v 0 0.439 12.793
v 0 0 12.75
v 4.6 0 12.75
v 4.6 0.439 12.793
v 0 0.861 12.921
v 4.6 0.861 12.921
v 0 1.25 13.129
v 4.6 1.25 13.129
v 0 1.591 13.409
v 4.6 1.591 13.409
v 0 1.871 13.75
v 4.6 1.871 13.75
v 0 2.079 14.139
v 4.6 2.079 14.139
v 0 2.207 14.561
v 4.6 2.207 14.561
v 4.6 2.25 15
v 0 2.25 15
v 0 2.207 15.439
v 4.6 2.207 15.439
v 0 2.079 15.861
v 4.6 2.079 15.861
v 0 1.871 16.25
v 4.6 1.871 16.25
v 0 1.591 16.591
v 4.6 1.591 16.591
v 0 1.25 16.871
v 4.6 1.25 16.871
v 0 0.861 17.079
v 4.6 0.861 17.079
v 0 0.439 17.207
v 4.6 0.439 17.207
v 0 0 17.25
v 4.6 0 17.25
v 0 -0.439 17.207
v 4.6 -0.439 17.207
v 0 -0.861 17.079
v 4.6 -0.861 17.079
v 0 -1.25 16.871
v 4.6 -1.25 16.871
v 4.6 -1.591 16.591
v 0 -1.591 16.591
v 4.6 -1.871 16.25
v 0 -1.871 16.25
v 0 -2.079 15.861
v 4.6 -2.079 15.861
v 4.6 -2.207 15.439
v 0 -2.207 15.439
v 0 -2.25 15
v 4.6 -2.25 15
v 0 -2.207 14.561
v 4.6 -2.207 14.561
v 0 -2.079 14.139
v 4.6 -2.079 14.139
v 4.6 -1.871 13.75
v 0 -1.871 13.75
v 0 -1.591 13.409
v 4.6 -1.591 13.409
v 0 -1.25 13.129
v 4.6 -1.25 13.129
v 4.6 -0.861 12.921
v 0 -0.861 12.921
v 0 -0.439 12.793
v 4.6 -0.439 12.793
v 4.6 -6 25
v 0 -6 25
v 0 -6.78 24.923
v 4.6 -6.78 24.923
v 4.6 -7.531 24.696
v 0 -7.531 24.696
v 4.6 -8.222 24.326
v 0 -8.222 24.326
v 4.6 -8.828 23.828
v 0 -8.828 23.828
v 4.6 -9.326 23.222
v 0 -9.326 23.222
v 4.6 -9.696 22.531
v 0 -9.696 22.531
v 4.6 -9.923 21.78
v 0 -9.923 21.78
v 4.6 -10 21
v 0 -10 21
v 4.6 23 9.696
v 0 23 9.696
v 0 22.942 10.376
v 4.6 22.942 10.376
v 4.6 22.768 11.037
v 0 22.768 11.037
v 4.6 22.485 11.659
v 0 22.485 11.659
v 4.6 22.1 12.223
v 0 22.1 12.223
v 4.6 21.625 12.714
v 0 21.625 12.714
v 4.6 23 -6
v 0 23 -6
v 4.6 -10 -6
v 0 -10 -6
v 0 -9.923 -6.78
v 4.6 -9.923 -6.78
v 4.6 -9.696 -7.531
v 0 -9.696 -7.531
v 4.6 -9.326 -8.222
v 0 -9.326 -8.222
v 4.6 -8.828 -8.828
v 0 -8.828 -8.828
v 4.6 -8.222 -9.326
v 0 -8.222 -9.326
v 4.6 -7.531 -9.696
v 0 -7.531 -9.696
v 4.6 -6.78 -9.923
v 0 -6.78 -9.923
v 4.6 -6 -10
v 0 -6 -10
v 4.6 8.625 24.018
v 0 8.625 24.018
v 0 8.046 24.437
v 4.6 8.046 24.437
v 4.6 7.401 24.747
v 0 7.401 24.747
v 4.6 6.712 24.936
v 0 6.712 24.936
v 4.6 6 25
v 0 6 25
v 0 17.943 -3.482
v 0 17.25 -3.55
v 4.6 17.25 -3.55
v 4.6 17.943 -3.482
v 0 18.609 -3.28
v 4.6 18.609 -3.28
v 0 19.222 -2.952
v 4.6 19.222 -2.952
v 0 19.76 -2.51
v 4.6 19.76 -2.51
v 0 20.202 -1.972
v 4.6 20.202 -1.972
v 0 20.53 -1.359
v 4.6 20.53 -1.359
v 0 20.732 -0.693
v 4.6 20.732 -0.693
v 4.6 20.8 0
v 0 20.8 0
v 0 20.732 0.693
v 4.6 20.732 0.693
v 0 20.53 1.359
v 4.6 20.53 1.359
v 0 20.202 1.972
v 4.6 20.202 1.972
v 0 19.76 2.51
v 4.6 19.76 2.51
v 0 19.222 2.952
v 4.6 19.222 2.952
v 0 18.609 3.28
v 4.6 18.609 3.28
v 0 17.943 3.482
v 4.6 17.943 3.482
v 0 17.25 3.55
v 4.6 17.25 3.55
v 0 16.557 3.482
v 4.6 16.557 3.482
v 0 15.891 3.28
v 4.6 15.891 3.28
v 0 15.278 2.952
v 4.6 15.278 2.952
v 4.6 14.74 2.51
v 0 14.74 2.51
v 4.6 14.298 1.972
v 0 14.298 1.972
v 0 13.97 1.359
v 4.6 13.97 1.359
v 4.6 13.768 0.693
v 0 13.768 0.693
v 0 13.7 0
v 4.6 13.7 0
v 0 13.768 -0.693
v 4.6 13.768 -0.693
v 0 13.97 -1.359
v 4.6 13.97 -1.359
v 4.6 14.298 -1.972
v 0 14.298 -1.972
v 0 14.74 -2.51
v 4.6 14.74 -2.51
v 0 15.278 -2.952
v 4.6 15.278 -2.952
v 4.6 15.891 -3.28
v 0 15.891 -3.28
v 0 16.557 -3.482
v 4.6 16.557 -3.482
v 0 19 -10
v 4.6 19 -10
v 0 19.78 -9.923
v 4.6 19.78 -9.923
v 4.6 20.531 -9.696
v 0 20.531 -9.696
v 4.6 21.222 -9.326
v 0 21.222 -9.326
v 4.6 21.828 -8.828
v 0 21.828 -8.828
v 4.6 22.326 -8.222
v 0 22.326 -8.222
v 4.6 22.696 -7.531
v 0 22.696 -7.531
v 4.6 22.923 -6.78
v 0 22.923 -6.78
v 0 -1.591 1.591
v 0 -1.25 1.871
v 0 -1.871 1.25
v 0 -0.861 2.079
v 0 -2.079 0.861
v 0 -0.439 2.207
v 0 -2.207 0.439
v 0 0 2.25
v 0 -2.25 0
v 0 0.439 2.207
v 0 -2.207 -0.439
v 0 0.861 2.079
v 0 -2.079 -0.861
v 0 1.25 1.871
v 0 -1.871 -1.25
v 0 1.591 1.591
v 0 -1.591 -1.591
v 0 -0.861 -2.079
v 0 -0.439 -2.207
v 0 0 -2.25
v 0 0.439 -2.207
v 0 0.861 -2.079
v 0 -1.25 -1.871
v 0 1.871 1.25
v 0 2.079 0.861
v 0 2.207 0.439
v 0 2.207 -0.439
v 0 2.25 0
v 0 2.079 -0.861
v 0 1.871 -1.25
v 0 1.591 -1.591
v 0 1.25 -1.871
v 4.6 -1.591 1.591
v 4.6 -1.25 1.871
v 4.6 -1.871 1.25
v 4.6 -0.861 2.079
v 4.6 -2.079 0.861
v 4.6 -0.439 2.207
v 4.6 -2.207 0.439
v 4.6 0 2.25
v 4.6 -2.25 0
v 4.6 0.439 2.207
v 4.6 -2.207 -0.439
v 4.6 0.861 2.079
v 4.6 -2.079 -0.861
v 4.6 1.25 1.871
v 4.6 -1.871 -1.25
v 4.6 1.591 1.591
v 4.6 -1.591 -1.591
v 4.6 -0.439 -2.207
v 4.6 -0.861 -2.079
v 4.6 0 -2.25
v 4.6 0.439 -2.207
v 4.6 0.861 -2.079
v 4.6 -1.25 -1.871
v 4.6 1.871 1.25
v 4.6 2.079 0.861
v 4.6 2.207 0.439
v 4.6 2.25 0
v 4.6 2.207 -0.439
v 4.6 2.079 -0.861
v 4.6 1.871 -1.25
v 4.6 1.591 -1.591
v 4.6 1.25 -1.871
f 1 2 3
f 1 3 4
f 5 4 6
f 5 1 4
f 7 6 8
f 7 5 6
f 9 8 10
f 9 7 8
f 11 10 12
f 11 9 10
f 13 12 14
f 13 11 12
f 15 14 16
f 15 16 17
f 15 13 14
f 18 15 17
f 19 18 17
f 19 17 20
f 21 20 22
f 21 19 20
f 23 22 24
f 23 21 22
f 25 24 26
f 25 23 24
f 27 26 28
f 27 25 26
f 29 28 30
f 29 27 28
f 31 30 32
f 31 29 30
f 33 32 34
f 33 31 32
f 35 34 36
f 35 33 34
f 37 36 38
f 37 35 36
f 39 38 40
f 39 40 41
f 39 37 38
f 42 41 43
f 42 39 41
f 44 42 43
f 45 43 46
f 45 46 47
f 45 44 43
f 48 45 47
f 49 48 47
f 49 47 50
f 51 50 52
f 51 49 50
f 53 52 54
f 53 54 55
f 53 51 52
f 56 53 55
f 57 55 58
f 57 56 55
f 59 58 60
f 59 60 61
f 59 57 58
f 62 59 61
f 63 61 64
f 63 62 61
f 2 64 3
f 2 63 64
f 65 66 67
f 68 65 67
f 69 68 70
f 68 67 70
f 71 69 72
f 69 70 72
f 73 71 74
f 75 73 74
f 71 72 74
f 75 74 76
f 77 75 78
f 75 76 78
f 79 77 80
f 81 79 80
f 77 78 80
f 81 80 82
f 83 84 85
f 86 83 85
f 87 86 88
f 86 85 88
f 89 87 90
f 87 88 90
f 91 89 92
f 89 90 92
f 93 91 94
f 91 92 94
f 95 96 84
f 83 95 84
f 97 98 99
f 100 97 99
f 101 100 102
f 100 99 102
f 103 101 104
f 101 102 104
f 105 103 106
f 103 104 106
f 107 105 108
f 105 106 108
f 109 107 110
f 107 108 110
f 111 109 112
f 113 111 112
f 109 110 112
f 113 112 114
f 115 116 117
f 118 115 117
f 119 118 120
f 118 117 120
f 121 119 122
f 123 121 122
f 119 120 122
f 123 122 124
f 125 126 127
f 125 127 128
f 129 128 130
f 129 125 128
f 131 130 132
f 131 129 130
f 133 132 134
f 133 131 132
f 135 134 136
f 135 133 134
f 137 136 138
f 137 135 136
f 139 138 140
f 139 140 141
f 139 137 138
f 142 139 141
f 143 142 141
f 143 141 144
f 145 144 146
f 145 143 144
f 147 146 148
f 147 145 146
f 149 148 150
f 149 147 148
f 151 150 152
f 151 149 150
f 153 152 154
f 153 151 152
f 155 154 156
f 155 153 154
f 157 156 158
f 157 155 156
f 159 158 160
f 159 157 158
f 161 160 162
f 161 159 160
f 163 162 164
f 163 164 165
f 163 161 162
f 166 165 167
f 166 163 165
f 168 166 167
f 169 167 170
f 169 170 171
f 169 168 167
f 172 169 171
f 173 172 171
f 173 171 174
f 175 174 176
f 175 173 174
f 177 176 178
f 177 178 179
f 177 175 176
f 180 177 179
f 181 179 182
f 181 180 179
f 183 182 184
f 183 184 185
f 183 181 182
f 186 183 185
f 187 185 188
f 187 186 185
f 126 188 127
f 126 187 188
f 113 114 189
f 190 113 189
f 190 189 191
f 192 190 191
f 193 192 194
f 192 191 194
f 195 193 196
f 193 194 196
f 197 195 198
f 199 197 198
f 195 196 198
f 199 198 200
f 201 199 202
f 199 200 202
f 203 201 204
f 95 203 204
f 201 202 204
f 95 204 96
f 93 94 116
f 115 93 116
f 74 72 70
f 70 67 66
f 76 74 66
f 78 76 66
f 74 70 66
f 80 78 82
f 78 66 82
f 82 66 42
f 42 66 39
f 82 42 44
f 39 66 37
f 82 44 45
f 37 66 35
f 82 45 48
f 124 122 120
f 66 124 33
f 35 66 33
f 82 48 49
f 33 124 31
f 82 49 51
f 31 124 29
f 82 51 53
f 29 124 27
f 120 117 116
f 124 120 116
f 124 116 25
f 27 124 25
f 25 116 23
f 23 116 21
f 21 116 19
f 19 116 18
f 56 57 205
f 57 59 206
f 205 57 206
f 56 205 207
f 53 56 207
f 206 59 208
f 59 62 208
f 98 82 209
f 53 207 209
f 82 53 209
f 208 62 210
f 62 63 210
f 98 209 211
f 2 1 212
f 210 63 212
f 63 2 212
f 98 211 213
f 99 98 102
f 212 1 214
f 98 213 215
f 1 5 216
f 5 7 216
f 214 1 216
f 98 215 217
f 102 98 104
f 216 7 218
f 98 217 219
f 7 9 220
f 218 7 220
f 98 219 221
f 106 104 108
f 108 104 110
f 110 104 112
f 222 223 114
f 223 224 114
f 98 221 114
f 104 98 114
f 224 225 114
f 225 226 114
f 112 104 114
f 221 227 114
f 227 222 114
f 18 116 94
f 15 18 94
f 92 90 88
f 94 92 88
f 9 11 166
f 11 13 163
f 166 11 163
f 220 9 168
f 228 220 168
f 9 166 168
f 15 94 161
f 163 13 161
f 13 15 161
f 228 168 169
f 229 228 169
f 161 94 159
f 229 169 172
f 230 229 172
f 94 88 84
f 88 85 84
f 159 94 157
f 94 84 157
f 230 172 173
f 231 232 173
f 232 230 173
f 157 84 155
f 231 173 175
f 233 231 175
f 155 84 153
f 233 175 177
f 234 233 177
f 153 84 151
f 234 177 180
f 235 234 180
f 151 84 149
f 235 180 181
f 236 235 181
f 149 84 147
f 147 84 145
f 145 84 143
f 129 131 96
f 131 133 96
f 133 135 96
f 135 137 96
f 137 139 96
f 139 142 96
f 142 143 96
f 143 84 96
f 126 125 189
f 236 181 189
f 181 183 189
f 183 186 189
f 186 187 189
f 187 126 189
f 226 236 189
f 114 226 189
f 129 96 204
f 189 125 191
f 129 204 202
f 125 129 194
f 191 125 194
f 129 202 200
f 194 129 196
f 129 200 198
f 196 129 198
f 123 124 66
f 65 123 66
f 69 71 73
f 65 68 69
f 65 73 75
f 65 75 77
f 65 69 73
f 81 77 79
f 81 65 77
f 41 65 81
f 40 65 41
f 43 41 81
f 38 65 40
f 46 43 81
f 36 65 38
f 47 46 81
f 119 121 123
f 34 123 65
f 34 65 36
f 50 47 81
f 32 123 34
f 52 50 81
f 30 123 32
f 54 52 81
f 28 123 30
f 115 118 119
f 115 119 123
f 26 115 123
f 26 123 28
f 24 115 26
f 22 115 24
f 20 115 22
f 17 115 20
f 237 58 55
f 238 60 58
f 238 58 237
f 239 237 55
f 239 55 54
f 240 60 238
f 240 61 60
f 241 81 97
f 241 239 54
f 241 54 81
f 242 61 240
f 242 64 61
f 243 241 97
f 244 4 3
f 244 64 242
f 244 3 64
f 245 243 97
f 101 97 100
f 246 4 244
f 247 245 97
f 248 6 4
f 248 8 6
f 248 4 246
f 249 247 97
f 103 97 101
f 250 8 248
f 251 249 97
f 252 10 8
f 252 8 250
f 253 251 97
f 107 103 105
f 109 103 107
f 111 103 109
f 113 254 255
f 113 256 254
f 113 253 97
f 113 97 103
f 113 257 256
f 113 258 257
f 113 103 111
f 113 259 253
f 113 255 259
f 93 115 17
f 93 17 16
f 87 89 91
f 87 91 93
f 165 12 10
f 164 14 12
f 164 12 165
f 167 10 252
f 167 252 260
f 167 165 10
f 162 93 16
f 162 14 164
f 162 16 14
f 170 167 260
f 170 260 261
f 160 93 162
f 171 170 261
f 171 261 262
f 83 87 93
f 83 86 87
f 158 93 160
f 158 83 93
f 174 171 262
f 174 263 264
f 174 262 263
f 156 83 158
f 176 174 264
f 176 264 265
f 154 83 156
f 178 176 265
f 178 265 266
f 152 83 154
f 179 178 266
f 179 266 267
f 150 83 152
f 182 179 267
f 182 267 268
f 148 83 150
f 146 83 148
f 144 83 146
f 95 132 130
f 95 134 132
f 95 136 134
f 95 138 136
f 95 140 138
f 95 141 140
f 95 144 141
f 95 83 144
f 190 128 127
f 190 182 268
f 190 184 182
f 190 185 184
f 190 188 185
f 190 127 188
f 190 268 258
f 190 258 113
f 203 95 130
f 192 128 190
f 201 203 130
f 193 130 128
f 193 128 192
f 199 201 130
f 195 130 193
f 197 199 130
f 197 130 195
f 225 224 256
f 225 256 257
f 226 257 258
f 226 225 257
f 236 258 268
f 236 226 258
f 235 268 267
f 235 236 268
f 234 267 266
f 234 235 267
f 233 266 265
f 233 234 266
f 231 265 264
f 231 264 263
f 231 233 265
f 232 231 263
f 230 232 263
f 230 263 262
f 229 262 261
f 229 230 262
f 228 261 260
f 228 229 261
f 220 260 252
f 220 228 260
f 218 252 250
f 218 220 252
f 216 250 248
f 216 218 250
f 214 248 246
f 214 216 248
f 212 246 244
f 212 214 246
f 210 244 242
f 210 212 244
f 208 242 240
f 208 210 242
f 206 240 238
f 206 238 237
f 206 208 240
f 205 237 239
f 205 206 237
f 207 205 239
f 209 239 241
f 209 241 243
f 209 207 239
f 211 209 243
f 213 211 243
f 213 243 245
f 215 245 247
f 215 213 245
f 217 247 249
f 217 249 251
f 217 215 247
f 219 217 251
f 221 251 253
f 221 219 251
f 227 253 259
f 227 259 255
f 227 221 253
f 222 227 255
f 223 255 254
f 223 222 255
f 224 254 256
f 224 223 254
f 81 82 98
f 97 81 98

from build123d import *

# Parameters (mm, degrees)
SKETCH1_R           = 2.25
SKETCH1_R_2         = 3.55
BOSS_EXTRUDE1_DEPTH = 4.6


with BuildPart() as part:
    # Sketch1 → Boss-Extrude1 (new body)
    with BuildSketch(Plane(origin=(0, 0, 0), x_dir=(0, 0, -1), z_dir=(1, 0, 0))):
        with BuildLine():
            Line((-21, -10), (6, -10))
            ThreePointArc((6, -10), (8.828427125, -8.828427125), (10, -6))
            Line((10, -6), (10, 19))
            ThreePointArc((10, 19), (8.828427125, 21.828427125), (6, 23))
            Line((6, 23), (-9.695652174, 23))
            ThreePointArc((-9.695652174, 23), (-11.354136506, 22.63997661), (-12.714074263, 21.62471486))
            Line((-12.714074263, 21.62471486), (-24.018422089, 8.62471486))
            ThreePointArc((-24.018422089, 8.62471486), (-24.746577662, 7.401126626), (-25, 6))
            Line((-25, 6), (-25, -6))
            ThreePointArc((-25, -6), (-23.828427125, -8.828427125), (-21, -10))
        make_face()
        with Locations((-15, 0)):
            Circle(SKETCH1_R, mode=Mode.SUBTRACT)
        with Locations((0, 17.25)):
            Circle(SKETCH1_R_2, mode=Mode.SUBTRACT)
        Circle(SKETCH1_R, mode=Mode.SUBTRACT)
    extrude(amount=BOSS_EXTRUDE1_DEPTH)


solid = part.part
